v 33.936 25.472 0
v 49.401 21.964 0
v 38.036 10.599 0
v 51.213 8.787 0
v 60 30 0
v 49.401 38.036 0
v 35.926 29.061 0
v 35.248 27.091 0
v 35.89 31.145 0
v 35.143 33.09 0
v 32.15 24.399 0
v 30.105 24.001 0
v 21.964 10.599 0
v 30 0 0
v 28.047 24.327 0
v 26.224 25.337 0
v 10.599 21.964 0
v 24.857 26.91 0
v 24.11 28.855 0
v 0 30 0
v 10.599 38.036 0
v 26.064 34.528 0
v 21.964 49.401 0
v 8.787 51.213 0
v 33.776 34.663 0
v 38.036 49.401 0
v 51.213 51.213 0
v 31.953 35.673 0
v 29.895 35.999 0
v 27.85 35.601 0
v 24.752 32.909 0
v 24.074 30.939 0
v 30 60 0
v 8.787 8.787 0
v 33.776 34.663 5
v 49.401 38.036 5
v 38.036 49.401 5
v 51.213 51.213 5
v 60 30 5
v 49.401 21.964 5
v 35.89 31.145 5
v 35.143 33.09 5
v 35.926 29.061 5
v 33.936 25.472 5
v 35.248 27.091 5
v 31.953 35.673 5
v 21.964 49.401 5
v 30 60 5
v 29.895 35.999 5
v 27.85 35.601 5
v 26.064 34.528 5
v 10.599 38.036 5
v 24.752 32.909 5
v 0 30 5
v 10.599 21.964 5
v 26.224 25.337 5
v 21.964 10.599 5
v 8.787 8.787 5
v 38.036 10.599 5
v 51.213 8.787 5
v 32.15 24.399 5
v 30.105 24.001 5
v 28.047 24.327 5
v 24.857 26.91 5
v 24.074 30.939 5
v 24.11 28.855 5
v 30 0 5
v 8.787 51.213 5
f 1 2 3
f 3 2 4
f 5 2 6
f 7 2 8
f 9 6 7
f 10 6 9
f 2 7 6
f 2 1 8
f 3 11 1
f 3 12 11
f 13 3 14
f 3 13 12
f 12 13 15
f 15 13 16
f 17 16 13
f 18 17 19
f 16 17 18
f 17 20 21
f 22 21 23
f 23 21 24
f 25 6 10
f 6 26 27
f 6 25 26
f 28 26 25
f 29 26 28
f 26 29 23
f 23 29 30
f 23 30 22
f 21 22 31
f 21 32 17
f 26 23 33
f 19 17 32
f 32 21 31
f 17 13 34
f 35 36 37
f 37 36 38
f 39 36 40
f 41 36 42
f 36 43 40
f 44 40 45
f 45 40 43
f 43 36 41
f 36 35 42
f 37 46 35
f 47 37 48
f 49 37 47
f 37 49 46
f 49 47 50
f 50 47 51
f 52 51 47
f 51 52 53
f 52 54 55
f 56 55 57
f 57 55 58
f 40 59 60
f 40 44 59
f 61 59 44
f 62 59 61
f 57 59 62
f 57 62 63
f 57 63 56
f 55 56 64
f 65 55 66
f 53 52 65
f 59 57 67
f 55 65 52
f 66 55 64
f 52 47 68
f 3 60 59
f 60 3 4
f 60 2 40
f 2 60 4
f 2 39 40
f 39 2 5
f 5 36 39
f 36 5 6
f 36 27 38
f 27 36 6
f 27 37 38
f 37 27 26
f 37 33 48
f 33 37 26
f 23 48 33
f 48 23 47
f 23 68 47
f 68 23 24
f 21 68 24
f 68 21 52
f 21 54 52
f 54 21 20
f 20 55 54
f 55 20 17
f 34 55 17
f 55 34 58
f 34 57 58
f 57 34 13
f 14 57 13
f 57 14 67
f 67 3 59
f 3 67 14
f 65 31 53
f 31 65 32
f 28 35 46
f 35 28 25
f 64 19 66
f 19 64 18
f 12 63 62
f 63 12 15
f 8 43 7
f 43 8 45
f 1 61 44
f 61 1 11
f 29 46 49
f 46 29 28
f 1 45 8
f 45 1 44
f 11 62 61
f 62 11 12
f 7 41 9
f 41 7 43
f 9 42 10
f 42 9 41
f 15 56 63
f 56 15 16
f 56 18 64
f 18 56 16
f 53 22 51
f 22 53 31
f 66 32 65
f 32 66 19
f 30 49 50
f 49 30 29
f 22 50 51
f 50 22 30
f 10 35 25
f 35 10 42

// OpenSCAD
$fn = 32;

// ----------------------------------------------------------------------
// Star wheel: 8-point blunt, R30
// ----------------------------------------------------------------------

// --- parameters (mm) ---
n_points = 8;             // number of points / teeth
r_out = 30;               // tip radius
r_in = 21;                // root radius
bore_r = 6;               // centre bore radius
plate_t = 5;              // plate thickness, Z (extrusion height)
bore_d = 12;              // centre bore diameter

profile = [[30, 60], [21.964, 49.401], [8.787, 51.213], [10.599, 38.036], [0, 30], [10.599, 21.964], [8.787, 8.787], [21.964, 10.599], [30, 0], [38.036, 10.599], [51.213, 8.787], [49.401, 21.964], [60, 30], [49.401, 38.036], [51.213, 51.213], [38.036, 49.401]];  // primary outline, 16 points, counter clockwise
void_1 = [[35.89, 31.145], [35.143, 33.09], [33.776, 34.663], [31.953, 35.673], [29.895, 35.999], [27.85, 35.601], [26.064, 34.528], [24.752, 32.909], [24.074, 30.939], [24.11, 28.855], [24.857, 26.91], [26.224, 25.337], [28.047, 24.327], [30.105, 24.001], [32.15, 24.399], [33.936, 25.472], [35.248, 27.091], [35.926, 29.061]];  // centre bore, 18 points

// --- the one profile operation ---
difference() {
  linear_extrude(height = plate_t) polygon(points = profile);
  translate([0, 0, -1])
    linear_extrude(height = plate_t + 2) polygon(points = void_1);
}
